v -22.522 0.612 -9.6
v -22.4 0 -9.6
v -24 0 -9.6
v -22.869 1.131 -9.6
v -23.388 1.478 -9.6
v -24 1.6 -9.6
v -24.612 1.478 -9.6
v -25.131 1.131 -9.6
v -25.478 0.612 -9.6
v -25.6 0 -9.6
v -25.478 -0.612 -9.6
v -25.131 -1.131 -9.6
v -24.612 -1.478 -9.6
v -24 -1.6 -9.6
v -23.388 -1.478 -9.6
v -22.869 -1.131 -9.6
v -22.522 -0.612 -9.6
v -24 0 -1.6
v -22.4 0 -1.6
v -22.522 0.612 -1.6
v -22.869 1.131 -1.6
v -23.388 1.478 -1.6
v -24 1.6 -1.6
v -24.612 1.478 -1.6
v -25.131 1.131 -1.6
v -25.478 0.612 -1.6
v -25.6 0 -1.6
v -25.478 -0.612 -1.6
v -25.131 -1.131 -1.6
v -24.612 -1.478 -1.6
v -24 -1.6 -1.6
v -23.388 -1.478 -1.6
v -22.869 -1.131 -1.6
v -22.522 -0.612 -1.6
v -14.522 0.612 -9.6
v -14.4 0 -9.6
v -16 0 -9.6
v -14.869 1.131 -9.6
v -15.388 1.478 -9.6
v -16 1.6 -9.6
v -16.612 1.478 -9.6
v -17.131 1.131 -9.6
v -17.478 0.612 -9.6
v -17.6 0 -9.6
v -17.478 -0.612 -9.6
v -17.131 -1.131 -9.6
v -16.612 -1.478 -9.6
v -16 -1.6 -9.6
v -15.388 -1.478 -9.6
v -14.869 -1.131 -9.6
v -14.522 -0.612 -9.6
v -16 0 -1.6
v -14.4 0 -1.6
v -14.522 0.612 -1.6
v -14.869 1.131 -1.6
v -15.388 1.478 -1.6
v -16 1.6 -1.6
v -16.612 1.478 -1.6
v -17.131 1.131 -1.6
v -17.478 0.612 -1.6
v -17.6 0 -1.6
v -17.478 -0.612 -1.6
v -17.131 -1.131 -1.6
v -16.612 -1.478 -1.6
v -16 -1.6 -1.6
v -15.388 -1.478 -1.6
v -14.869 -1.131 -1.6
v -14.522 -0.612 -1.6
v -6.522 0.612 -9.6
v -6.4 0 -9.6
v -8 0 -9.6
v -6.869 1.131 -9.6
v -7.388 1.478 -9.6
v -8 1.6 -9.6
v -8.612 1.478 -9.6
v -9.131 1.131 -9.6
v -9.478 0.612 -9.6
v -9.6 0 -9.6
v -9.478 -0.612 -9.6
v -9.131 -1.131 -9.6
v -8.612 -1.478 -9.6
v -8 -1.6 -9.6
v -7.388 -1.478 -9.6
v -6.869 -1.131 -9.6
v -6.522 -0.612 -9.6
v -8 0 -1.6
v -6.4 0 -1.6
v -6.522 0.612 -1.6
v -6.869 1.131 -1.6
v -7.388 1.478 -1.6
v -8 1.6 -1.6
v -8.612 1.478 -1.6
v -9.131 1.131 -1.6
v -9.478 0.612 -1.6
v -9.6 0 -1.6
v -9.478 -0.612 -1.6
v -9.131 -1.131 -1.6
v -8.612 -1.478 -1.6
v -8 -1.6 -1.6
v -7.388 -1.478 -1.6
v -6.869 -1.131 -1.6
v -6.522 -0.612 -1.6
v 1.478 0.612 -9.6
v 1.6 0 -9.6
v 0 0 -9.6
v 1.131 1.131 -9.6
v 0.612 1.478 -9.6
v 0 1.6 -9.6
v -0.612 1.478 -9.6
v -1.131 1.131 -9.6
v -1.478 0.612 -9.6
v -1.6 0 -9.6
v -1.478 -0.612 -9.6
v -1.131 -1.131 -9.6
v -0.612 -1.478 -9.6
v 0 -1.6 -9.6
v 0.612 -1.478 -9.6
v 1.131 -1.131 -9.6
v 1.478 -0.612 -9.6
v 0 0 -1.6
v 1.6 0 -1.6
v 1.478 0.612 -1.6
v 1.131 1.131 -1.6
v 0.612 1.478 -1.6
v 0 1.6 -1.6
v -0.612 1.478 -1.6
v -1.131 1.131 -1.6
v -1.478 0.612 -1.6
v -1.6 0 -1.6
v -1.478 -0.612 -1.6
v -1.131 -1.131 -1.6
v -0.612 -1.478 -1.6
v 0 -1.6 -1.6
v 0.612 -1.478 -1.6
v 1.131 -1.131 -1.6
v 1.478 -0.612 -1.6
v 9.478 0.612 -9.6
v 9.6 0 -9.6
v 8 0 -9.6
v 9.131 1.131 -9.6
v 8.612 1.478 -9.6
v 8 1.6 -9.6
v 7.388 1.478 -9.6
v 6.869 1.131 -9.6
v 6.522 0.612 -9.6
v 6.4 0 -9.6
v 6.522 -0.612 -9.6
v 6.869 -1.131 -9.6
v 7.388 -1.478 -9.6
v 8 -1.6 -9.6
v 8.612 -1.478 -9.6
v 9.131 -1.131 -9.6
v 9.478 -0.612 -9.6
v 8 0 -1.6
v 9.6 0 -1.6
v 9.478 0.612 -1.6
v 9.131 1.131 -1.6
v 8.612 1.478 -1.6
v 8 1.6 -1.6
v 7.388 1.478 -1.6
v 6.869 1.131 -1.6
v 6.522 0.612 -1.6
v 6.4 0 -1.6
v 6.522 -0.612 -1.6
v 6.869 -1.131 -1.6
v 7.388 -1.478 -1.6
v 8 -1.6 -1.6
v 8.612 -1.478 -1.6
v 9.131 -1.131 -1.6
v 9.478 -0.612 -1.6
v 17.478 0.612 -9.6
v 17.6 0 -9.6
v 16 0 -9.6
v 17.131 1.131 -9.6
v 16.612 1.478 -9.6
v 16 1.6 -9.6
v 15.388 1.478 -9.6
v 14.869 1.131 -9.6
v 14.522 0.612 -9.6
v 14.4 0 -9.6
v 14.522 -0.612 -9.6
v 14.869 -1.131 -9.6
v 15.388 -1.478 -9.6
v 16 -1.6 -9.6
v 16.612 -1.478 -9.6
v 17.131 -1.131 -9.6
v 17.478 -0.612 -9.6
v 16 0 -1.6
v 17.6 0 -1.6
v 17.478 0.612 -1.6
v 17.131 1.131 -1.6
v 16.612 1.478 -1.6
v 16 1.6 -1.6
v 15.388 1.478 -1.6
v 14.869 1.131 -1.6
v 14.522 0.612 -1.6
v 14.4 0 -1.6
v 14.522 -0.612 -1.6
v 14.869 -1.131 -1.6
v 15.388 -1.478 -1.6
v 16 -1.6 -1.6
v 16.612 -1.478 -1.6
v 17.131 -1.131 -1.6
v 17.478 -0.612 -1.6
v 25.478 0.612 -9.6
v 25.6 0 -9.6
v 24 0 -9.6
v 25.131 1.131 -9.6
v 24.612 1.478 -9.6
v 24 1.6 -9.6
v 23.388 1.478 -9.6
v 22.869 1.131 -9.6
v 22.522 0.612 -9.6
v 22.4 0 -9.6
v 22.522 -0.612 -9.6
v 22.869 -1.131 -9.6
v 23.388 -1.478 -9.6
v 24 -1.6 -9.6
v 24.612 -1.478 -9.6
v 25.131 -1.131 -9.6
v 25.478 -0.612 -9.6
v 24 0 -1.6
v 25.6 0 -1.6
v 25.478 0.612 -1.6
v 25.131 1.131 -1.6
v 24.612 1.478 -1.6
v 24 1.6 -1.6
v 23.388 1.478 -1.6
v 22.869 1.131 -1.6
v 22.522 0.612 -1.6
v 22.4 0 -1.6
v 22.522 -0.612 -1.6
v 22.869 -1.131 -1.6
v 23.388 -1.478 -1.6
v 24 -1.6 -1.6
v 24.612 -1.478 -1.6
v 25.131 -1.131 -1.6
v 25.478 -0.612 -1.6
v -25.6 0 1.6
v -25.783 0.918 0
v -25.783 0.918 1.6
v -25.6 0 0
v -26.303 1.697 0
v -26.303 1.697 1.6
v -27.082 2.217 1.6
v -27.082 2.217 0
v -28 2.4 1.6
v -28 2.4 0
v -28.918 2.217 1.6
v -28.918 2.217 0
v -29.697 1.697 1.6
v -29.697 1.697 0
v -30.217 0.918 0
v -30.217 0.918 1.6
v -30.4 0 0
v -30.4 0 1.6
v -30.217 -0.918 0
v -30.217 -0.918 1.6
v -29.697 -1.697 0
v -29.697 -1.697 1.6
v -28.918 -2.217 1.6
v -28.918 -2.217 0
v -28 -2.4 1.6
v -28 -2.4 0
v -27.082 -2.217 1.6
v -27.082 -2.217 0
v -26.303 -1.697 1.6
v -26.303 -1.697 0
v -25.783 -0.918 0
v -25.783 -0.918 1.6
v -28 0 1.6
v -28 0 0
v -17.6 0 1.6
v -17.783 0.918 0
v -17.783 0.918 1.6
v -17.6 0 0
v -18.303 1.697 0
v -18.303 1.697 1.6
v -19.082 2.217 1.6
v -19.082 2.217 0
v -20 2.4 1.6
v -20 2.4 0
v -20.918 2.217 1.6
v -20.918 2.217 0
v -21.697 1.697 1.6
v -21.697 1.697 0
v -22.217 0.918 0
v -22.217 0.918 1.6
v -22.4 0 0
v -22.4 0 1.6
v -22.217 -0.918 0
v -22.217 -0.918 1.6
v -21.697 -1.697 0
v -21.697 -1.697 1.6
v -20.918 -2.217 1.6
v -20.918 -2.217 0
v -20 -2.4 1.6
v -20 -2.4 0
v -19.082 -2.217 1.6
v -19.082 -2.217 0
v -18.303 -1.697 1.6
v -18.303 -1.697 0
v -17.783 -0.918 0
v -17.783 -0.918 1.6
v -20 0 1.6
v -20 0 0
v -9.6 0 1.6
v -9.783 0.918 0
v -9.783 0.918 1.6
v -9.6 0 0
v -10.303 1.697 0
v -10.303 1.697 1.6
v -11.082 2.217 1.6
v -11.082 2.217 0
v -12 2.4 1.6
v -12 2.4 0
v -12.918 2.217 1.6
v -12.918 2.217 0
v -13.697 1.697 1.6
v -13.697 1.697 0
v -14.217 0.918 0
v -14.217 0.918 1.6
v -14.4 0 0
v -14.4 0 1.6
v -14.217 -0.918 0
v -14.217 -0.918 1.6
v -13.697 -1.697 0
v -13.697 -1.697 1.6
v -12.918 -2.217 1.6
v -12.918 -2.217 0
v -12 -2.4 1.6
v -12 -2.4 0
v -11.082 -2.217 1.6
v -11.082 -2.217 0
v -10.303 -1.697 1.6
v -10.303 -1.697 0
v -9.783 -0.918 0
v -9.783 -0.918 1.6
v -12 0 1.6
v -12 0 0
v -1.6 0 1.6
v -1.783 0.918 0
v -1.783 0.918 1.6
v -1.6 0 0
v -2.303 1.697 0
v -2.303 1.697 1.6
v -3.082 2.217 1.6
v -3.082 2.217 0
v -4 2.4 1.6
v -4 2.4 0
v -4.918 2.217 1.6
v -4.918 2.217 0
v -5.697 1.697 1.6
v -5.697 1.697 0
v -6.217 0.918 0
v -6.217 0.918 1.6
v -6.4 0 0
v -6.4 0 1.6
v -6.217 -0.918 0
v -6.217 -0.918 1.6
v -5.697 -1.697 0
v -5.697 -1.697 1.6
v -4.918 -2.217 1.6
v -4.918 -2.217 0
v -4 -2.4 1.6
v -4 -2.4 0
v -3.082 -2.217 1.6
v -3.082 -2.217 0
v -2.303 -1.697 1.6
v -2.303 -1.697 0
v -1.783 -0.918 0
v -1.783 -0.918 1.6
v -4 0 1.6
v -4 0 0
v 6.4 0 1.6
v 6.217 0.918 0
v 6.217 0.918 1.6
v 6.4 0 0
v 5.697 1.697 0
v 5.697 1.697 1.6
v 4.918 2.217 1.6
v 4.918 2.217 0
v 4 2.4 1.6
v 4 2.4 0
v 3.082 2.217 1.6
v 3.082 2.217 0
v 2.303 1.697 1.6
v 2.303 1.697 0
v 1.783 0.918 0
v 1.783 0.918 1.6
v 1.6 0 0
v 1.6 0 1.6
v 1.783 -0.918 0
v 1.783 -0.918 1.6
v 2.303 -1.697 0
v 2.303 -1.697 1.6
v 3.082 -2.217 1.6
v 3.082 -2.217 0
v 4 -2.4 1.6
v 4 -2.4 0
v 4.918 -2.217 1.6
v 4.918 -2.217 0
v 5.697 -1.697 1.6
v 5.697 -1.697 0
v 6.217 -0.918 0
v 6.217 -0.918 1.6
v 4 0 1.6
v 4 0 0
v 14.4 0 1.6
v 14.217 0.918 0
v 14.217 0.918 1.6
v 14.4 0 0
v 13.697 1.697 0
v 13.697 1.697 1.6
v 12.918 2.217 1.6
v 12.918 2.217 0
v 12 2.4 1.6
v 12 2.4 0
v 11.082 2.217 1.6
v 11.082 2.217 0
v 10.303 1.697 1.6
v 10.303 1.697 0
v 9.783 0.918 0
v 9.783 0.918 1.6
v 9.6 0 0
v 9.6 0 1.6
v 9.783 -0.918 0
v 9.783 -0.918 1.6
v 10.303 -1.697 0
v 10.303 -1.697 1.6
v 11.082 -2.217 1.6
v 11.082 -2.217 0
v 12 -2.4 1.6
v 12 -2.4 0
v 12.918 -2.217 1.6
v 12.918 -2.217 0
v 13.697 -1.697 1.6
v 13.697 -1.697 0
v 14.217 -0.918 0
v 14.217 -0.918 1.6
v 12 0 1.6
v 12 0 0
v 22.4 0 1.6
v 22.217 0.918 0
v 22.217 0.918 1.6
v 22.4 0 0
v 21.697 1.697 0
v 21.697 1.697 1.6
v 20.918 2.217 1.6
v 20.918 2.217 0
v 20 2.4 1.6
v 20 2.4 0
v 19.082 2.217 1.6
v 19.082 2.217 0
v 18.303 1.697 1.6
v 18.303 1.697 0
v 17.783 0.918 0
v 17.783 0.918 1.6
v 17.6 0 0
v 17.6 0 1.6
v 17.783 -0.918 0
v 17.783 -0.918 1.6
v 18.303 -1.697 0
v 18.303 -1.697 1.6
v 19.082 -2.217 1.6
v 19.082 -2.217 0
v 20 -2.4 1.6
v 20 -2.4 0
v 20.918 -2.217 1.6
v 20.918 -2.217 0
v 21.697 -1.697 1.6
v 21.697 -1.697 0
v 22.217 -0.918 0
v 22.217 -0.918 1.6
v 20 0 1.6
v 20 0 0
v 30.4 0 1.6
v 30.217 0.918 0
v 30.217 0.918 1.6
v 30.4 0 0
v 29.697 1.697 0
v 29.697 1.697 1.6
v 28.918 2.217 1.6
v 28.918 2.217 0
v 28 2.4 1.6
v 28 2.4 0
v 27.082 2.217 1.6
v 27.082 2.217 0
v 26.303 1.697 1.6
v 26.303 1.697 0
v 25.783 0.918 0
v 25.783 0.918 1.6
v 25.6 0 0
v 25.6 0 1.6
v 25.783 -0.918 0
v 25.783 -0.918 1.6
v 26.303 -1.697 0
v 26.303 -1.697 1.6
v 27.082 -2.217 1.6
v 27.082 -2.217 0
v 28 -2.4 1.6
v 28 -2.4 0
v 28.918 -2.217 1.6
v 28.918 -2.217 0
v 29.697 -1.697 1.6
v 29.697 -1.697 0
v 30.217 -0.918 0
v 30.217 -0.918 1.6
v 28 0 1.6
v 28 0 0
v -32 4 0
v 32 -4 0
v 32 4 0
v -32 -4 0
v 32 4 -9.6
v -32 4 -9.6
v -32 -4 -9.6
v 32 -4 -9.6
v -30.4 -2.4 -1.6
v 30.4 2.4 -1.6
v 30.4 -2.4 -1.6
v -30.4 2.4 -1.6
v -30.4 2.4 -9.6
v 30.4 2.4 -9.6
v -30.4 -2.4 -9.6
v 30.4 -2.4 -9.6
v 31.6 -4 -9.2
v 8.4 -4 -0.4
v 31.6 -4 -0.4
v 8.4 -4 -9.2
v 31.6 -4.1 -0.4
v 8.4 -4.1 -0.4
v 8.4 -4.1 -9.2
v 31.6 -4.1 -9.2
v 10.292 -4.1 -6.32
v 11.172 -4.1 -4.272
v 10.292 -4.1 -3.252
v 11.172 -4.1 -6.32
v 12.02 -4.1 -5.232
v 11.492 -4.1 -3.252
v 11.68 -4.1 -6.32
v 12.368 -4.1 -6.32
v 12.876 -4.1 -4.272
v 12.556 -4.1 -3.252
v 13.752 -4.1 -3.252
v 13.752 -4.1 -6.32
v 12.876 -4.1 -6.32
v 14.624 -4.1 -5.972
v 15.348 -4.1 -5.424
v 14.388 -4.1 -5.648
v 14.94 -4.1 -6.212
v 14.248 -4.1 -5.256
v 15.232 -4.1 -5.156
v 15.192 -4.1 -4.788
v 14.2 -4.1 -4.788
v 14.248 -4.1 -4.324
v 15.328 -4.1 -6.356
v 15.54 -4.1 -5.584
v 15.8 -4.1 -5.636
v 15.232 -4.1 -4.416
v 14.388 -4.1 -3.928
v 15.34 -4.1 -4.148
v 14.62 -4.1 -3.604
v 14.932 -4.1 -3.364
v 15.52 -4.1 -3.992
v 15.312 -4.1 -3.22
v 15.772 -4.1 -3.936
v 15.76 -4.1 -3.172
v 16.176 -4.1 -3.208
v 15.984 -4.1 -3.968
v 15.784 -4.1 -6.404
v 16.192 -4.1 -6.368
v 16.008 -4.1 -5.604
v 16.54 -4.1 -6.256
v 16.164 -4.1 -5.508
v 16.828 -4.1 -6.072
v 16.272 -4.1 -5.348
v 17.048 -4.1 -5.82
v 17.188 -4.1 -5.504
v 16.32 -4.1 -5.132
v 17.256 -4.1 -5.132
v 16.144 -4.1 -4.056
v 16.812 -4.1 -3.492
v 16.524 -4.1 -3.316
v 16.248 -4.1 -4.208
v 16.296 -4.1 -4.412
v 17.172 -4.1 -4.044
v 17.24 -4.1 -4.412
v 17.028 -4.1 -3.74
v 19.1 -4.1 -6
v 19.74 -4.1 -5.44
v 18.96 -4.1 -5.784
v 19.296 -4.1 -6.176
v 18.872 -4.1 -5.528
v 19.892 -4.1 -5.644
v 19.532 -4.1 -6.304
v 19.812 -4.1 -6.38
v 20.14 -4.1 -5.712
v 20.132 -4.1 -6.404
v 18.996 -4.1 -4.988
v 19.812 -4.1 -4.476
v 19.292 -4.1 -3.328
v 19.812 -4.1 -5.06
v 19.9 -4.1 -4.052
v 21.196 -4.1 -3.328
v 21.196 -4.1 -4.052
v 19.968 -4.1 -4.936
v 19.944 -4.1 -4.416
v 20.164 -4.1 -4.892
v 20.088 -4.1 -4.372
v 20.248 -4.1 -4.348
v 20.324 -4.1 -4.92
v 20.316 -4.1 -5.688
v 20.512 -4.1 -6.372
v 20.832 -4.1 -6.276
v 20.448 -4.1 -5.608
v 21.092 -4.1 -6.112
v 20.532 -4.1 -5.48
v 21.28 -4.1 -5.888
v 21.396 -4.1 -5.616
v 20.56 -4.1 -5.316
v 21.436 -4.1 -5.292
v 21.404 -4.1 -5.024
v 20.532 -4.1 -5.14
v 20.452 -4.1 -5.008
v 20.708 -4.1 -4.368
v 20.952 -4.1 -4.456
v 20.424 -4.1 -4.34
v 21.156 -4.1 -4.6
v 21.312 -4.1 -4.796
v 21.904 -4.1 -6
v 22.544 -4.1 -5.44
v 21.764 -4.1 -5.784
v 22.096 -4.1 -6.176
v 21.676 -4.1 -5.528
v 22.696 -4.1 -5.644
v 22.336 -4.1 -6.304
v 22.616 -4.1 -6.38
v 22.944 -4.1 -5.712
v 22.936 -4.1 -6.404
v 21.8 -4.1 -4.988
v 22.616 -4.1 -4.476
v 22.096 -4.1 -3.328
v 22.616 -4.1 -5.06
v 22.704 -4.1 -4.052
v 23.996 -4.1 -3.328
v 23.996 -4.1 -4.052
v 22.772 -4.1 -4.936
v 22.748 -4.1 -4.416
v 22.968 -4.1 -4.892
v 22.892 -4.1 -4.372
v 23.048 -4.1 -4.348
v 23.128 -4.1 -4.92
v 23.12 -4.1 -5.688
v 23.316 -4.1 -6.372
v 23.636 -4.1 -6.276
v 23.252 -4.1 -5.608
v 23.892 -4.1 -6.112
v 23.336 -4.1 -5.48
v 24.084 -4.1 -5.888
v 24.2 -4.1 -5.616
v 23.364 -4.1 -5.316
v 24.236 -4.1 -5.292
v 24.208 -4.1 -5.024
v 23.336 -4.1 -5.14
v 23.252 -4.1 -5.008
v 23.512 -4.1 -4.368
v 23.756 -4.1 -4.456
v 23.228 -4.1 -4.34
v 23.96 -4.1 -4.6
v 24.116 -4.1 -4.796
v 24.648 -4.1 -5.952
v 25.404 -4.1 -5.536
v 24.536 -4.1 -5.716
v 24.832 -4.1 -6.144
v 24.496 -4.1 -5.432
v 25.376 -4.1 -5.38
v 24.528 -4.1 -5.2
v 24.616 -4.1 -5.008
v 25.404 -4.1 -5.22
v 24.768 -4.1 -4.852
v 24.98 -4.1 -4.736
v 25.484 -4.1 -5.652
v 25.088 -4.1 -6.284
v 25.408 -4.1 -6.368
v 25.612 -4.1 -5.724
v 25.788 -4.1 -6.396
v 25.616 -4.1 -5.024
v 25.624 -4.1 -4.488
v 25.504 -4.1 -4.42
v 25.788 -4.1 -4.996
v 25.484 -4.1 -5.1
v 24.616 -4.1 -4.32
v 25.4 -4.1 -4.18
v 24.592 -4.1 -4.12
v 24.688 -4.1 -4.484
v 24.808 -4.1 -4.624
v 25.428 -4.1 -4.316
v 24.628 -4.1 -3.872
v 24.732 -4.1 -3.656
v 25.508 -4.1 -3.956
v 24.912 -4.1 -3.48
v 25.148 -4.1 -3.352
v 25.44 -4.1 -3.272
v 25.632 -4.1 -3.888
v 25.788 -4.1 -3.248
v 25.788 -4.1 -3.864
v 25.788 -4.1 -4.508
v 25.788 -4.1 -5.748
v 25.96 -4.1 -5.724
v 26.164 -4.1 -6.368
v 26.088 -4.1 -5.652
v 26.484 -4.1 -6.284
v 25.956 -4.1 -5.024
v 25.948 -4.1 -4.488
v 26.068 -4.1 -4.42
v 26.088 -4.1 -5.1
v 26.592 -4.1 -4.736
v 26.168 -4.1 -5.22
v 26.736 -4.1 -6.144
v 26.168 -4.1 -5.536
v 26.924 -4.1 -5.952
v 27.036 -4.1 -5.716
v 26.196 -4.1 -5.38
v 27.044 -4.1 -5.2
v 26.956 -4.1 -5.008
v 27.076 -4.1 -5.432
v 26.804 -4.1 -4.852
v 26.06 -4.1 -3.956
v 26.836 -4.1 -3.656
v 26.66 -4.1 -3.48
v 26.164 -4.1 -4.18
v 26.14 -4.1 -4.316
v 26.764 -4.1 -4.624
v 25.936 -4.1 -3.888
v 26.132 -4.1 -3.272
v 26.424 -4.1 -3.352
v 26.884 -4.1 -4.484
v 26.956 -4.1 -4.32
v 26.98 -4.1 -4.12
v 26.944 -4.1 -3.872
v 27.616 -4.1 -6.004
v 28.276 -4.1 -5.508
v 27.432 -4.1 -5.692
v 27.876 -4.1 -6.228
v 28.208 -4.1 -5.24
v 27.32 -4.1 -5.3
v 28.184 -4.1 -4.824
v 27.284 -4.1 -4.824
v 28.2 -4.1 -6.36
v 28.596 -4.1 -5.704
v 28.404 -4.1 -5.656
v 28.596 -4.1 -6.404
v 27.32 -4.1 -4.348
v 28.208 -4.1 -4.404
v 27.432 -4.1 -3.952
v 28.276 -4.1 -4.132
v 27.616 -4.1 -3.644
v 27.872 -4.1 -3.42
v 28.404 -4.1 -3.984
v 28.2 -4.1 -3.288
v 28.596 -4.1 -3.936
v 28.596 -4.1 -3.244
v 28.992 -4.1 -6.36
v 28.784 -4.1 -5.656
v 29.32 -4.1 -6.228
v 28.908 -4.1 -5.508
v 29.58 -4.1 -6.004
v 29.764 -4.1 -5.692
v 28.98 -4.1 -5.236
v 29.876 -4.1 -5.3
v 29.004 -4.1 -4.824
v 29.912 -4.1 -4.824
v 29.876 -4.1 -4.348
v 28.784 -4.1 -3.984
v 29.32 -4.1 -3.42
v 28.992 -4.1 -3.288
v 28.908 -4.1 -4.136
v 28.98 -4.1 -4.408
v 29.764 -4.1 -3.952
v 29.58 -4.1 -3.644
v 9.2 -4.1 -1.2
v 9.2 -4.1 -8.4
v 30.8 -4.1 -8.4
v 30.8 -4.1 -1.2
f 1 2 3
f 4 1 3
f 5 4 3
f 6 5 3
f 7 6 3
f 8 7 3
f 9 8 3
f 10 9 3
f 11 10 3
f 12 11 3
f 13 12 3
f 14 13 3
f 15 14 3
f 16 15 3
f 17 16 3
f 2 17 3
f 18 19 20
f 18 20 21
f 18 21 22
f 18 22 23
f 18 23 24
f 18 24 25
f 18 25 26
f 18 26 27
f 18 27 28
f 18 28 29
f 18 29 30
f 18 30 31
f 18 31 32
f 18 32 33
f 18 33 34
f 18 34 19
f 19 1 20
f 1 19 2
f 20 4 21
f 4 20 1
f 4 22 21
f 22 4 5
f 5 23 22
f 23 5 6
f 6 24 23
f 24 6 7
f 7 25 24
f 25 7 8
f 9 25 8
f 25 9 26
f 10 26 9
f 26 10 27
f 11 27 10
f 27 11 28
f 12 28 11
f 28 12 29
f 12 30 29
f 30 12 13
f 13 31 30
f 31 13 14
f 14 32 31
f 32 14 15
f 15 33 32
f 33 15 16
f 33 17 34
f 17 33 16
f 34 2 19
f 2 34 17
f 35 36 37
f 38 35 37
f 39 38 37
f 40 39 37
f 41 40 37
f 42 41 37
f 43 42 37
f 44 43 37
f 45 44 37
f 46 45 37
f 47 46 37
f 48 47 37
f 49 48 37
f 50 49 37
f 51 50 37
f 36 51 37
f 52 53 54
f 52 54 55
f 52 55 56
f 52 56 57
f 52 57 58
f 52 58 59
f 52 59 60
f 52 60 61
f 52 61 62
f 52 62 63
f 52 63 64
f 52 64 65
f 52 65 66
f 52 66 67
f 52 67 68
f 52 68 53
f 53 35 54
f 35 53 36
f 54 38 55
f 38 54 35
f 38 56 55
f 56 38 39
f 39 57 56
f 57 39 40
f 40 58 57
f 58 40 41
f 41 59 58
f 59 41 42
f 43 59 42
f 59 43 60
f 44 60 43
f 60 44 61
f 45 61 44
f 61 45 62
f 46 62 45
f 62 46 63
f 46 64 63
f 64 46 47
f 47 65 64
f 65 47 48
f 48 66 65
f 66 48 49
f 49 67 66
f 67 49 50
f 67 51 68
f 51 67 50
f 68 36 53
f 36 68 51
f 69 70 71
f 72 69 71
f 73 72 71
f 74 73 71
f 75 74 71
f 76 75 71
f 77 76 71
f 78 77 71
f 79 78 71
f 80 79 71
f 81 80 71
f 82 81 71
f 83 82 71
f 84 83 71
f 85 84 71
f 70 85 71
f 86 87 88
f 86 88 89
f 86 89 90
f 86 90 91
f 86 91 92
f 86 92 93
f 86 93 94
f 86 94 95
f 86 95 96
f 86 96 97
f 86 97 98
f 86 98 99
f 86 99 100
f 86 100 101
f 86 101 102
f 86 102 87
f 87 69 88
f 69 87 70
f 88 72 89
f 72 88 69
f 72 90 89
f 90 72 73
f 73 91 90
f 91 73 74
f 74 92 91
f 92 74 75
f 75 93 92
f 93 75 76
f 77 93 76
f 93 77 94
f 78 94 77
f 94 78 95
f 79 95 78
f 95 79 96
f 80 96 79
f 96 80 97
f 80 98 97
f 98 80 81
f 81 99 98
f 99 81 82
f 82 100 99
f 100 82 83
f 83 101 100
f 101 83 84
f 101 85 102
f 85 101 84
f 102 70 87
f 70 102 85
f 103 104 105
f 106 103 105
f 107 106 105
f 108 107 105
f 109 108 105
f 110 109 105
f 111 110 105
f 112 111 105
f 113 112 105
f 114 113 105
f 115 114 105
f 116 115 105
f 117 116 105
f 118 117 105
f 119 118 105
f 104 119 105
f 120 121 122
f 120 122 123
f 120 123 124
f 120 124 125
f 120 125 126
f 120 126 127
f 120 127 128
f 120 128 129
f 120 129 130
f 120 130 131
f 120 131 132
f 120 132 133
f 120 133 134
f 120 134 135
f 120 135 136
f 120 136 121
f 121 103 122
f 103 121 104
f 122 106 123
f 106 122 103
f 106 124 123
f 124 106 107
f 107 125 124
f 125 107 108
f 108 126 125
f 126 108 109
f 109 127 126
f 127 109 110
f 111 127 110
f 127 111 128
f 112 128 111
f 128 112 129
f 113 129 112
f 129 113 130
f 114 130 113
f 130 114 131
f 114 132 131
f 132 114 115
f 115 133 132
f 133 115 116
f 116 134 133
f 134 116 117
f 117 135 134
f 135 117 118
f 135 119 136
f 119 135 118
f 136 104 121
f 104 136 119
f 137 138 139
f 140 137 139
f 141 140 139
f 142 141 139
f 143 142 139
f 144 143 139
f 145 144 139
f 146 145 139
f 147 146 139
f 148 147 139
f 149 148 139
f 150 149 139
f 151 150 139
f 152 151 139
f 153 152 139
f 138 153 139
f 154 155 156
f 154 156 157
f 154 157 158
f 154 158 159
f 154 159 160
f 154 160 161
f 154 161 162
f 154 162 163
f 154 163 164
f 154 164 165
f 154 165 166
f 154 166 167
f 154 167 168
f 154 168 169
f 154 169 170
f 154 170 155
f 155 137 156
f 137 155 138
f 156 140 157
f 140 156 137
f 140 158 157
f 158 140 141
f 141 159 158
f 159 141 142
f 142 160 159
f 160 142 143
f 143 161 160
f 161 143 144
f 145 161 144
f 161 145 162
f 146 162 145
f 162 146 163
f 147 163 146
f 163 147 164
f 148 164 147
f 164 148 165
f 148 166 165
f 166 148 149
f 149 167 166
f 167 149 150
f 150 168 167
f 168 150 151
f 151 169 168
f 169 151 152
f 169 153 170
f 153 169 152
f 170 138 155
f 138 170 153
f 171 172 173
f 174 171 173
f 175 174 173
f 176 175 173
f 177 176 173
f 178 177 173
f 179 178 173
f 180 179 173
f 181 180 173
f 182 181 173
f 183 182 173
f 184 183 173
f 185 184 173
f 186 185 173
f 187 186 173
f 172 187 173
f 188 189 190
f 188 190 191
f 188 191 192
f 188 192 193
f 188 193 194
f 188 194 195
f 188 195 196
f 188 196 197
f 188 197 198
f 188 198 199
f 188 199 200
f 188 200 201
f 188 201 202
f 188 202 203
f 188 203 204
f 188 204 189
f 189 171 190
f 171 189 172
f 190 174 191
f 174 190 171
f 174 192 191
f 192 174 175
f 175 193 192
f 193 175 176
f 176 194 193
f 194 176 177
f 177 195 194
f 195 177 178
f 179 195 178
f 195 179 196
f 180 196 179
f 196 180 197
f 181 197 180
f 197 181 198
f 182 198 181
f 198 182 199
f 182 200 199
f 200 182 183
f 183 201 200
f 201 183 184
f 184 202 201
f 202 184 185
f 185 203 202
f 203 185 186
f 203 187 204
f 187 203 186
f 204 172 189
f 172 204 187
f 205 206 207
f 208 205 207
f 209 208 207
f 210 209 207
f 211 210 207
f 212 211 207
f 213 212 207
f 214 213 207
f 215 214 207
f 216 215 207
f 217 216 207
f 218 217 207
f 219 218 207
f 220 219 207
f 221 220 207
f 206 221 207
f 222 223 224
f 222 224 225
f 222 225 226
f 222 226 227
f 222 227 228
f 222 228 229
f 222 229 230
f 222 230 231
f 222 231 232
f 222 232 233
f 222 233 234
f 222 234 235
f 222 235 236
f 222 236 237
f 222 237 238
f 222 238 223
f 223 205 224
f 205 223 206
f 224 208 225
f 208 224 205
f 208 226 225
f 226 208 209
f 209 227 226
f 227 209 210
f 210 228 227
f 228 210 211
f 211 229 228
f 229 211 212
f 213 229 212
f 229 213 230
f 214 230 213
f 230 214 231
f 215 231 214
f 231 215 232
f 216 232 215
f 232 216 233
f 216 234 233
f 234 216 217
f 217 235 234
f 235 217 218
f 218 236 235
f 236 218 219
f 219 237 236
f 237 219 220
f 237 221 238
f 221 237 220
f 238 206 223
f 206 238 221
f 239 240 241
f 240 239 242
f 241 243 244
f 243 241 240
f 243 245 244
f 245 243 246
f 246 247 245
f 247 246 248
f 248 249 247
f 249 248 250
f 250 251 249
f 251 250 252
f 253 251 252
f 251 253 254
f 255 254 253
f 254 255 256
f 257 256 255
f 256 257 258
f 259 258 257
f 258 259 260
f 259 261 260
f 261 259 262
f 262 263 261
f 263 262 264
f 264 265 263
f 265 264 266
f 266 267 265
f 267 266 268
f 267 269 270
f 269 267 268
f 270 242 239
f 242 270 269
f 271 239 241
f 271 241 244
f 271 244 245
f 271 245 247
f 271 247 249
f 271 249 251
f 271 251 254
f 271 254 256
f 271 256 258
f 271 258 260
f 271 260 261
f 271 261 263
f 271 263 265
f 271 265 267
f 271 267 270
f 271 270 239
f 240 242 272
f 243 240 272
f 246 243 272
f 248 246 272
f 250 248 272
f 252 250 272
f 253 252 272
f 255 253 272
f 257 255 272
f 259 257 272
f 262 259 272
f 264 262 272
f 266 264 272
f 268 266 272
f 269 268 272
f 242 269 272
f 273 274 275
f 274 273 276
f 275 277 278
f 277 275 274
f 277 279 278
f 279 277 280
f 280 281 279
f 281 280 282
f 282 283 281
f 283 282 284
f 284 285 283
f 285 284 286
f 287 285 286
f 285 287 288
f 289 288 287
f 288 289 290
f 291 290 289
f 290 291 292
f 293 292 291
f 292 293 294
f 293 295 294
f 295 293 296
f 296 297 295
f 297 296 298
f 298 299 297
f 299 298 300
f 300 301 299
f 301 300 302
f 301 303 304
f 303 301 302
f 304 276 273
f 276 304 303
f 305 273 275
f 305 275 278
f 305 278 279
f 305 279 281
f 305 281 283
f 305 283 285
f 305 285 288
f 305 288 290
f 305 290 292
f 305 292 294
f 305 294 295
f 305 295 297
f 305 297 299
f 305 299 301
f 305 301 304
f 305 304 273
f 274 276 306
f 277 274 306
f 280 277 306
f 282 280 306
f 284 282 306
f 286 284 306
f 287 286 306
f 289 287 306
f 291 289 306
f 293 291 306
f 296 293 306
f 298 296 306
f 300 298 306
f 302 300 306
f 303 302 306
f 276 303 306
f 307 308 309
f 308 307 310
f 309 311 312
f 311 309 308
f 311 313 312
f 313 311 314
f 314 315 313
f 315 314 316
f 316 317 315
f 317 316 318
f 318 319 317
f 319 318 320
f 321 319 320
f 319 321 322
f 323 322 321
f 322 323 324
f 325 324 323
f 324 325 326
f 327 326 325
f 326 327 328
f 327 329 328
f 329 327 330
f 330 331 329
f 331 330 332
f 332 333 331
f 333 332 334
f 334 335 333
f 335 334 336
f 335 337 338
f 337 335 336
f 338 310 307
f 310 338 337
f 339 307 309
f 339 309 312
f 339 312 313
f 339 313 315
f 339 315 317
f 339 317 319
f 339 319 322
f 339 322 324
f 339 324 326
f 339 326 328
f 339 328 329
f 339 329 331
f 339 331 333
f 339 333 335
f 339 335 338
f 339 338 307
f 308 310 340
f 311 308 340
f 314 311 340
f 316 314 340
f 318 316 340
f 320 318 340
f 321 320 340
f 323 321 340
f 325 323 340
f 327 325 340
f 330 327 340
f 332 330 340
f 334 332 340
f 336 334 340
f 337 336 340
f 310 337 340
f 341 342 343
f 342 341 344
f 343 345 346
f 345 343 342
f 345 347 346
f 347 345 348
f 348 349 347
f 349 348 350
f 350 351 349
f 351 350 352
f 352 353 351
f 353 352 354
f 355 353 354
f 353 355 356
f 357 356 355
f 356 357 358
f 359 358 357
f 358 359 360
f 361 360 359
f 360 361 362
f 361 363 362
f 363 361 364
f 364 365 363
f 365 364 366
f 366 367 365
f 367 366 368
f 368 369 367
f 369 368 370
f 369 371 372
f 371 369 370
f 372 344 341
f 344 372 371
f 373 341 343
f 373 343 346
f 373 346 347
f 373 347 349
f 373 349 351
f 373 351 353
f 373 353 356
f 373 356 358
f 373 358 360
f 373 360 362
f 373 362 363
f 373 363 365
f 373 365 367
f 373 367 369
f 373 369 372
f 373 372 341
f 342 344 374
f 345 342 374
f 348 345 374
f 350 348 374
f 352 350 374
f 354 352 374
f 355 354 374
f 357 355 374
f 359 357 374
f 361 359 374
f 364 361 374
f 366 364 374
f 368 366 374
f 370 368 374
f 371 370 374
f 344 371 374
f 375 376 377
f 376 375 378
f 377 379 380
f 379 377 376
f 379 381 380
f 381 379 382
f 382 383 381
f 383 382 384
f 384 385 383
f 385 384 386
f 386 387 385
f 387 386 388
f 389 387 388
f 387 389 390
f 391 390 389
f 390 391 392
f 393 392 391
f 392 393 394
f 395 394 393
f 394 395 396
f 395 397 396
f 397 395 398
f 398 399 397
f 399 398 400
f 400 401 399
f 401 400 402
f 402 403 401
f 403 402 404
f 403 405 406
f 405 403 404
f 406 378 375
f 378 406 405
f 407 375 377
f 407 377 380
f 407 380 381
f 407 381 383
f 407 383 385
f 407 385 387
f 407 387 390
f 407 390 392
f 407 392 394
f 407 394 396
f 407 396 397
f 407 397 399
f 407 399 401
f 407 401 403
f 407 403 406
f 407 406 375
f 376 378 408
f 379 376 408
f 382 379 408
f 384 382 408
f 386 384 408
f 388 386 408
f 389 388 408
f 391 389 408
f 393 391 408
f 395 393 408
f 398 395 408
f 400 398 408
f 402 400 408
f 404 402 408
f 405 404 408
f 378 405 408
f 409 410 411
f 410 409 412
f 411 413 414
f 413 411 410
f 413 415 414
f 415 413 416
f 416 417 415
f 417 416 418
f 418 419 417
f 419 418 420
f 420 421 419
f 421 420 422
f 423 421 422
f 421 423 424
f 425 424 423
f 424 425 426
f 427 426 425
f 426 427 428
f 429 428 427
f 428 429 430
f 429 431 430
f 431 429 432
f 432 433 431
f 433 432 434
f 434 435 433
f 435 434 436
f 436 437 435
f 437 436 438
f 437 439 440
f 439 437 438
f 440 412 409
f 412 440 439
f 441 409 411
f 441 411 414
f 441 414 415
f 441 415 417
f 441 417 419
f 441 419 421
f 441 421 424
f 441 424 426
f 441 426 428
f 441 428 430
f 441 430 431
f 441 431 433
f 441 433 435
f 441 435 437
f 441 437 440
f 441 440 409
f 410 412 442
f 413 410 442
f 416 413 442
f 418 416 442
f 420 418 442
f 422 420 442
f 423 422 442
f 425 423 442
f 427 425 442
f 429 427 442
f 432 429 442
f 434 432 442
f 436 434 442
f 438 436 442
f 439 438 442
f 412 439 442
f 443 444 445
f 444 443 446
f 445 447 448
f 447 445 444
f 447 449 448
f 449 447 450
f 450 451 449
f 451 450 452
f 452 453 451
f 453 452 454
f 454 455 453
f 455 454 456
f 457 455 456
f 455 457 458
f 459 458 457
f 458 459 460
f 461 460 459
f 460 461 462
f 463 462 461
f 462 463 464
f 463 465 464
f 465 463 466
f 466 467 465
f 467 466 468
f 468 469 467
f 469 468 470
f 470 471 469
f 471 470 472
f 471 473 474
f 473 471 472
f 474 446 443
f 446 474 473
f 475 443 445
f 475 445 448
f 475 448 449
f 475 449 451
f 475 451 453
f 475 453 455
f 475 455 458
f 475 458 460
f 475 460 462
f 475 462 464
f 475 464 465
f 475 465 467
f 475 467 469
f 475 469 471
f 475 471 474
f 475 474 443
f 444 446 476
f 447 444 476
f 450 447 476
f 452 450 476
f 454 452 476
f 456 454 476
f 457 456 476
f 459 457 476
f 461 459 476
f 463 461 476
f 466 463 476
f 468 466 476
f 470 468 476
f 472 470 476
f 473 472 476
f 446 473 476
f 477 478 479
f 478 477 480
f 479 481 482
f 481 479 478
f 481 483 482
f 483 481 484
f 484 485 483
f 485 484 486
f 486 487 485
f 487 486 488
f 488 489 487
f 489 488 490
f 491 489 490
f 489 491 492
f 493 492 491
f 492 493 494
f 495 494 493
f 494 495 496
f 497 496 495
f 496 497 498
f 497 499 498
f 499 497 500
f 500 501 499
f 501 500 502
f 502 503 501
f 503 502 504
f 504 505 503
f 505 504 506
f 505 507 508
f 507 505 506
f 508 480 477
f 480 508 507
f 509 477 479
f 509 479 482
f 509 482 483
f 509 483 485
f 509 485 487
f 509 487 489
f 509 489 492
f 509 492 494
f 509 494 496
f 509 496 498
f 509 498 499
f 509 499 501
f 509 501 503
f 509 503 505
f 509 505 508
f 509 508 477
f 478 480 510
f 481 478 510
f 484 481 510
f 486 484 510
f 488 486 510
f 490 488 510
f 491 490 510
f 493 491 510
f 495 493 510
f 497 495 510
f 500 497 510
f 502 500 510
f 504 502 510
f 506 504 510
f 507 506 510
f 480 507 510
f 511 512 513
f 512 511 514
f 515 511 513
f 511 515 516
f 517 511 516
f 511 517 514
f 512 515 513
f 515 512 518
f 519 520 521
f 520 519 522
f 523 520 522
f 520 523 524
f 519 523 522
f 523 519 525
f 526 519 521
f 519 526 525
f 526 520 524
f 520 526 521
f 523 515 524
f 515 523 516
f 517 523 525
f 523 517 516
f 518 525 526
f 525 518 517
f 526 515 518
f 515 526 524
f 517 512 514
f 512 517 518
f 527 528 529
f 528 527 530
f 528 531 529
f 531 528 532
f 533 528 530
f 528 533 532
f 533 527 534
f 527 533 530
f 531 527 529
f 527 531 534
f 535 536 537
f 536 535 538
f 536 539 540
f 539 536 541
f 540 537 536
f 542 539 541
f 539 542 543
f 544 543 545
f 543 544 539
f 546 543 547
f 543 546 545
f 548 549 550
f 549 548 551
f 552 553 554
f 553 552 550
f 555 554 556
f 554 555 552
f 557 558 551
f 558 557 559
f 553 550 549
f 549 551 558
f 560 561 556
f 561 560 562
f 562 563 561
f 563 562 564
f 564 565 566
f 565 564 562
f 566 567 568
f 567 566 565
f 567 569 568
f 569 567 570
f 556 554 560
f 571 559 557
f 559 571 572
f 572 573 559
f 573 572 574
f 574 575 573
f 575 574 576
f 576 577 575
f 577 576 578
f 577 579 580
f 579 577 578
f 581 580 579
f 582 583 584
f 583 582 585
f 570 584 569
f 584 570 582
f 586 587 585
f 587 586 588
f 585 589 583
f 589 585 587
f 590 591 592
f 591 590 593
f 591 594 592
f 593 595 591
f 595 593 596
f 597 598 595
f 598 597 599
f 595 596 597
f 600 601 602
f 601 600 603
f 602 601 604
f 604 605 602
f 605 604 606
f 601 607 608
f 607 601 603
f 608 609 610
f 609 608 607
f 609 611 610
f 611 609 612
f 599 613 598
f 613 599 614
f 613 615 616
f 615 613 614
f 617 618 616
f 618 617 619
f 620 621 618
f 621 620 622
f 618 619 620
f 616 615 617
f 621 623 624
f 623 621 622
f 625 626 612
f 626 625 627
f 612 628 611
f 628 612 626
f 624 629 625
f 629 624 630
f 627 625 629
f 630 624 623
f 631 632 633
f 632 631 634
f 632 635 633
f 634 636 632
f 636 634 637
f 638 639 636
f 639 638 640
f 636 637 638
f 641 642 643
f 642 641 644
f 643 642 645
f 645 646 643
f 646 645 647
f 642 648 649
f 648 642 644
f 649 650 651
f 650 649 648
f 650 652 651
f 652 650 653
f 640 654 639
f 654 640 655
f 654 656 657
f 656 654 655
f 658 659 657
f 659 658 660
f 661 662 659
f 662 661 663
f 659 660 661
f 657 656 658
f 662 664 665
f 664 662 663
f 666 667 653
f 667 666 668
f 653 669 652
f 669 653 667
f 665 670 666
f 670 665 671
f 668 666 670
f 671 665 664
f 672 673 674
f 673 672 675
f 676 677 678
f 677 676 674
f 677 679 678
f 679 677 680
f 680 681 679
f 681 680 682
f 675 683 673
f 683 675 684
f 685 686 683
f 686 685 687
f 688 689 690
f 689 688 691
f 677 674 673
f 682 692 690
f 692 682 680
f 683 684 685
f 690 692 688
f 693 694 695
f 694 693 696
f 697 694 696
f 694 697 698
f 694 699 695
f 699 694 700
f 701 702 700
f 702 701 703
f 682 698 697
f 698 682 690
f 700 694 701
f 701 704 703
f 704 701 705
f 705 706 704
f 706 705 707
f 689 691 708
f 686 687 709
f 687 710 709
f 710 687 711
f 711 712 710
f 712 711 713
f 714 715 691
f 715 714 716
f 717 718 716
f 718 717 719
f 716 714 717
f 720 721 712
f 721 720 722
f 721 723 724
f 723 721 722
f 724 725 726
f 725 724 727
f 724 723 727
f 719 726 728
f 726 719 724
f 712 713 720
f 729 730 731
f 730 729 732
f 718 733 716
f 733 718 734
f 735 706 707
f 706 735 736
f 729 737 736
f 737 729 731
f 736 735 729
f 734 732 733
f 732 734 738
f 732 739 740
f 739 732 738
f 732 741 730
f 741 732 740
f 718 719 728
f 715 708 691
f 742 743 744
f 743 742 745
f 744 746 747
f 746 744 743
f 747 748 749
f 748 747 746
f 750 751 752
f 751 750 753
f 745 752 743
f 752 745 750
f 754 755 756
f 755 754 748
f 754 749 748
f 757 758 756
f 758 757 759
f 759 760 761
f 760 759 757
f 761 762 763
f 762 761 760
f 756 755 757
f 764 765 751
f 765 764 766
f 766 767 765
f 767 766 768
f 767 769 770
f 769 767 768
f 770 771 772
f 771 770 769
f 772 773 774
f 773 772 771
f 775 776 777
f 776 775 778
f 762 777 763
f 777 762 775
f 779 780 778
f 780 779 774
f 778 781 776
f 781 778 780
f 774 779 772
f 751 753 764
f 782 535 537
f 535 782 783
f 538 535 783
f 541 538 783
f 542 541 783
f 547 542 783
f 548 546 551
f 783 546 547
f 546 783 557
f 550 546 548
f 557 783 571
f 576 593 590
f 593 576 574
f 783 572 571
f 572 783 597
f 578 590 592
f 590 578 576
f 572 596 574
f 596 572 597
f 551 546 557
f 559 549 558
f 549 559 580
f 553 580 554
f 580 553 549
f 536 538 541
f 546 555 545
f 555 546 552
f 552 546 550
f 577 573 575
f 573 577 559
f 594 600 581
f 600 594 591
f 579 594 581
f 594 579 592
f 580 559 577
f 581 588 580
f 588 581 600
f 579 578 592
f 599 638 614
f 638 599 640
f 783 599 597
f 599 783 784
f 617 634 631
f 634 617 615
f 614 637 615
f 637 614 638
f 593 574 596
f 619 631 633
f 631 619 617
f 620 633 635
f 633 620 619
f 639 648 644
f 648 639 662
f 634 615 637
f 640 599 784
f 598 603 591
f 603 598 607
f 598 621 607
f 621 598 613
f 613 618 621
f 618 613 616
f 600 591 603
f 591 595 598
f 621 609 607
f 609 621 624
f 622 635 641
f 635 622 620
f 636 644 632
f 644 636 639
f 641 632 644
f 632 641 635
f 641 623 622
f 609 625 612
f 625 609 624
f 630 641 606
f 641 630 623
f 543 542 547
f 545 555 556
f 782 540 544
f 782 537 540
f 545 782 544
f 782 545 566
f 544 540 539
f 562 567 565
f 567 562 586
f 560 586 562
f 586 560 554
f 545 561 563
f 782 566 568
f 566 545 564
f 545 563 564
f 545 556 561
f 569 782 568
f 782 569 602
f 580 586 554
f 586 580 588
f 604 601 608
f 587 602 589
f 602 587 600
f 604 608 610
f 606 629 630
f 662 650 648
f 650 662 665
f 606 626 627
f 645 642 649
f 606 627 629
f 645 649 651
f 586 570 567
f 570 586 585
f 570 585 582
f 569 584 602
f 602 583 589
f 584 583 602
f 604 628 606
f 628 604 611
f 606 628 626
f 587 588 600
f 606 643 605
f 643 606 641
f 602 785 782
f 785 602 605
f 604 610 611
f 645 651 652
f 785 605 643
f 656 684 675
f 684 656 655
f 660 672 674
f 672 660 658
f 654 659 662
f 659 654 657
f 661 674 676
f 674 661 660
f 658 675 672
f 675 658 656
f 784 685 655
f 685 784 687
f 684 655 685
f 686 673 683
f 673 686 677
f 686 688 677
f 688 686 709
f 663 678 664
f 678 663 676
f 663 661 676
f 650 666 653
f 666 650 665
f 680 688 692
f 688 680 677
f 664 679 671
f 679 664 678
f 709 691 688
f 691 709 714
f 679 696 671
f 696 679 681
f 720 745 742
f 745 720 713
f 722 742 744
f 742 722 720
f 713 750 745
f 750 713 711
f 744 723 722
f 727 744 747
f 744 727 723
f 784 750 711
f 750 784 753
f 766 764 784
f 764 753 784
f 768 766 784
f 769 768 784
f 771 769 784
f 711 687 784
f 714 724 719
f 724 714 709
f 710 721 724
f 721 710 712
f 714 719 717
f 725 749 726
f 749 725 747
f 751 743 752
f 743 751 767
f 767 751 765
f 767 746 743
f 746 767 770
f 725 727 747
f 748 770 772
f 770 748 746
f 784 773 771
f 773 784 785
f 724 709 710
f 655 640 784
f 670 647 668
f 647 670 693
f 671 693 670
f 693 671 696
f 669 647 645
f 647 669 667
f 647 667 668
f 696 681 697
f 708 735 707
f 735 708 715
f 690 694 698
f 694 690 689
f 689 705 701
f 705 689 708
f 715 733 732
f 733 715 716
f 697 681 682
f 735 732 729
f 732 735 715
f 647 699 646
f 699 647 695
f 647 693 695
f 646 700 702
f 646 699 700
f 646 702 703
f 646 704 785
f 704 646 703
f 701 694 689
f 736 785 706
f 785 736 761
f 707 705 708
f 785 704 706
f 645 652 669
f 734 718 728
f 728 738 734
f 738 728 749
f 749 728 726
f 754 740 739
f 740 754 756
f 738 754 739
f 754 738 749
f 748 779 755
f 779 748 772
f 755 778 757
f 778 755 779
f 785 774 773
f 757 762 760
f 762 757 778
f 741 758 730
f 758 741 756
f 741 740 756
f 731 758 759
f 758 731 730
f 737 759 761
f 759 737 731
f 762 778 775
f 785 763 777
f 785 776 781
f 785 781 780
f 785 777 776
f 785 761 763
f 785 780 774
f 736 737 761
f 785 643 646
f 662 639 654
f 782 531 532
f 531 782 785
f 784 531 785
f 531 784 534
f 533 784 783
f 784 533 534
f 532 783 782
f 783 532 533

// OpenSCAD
use <../lib.scad>
use <197925a.scad>
use <3008.scad>
function ldraw_lib__3008d0b() = [
// 0 Brick  1 x  8 with License Plate "MC 5580" Sticker
// 0 Name: 3008d0b.dat
// 0 Author: Takeshi Takahashi [RainbowDolphin]
// 0 !LDRAW_ORG Shortcut UPDATE 2024-07
// 0 !LICENSE Licensed under CC BY 4.0 : see CAreadme.txt
// 
// 0 BFC CERTIFY CCW
  [0,"BFC","CERTIFY"],
  [0,"BFC","CCW"],
// 
// 0 !CATEGORY Sticker Shortcut
// 0 !KEYWORDS Bricklink 3008pb103, Highway rig, Model Team, Set 5580, truck
// 
// 0 !HISTORY 2024-08-26 [OrionP] Official Update 2024-07
// 
// 1 16 0 0 0 1 0 0 0 1 0 0 0 1 3008.dat
  [1,16,0,0,0,1,0,0,0,1,0,0,0,1, ldraw_lib__3008()],
// 1 16 50 12 -10 1 0 0 0 0 -1 0 1 0 197925a.dat
  [1,16,50,12,-10,1,0,0,0,0,-1,0,1,0, ldraw_lib__197925a()],
];
module ldraw_lib__3008d0b(step=0, col=false, unit=2/5, alt=false, line=0.2, solid=!$preview)
    makepoly(ldraw_lib__3008d0b(), step=step, col=col, unit=unit, alt=alt, line=line, solid=solid);
ldraw_lib__3008d0b(line=0.2);
